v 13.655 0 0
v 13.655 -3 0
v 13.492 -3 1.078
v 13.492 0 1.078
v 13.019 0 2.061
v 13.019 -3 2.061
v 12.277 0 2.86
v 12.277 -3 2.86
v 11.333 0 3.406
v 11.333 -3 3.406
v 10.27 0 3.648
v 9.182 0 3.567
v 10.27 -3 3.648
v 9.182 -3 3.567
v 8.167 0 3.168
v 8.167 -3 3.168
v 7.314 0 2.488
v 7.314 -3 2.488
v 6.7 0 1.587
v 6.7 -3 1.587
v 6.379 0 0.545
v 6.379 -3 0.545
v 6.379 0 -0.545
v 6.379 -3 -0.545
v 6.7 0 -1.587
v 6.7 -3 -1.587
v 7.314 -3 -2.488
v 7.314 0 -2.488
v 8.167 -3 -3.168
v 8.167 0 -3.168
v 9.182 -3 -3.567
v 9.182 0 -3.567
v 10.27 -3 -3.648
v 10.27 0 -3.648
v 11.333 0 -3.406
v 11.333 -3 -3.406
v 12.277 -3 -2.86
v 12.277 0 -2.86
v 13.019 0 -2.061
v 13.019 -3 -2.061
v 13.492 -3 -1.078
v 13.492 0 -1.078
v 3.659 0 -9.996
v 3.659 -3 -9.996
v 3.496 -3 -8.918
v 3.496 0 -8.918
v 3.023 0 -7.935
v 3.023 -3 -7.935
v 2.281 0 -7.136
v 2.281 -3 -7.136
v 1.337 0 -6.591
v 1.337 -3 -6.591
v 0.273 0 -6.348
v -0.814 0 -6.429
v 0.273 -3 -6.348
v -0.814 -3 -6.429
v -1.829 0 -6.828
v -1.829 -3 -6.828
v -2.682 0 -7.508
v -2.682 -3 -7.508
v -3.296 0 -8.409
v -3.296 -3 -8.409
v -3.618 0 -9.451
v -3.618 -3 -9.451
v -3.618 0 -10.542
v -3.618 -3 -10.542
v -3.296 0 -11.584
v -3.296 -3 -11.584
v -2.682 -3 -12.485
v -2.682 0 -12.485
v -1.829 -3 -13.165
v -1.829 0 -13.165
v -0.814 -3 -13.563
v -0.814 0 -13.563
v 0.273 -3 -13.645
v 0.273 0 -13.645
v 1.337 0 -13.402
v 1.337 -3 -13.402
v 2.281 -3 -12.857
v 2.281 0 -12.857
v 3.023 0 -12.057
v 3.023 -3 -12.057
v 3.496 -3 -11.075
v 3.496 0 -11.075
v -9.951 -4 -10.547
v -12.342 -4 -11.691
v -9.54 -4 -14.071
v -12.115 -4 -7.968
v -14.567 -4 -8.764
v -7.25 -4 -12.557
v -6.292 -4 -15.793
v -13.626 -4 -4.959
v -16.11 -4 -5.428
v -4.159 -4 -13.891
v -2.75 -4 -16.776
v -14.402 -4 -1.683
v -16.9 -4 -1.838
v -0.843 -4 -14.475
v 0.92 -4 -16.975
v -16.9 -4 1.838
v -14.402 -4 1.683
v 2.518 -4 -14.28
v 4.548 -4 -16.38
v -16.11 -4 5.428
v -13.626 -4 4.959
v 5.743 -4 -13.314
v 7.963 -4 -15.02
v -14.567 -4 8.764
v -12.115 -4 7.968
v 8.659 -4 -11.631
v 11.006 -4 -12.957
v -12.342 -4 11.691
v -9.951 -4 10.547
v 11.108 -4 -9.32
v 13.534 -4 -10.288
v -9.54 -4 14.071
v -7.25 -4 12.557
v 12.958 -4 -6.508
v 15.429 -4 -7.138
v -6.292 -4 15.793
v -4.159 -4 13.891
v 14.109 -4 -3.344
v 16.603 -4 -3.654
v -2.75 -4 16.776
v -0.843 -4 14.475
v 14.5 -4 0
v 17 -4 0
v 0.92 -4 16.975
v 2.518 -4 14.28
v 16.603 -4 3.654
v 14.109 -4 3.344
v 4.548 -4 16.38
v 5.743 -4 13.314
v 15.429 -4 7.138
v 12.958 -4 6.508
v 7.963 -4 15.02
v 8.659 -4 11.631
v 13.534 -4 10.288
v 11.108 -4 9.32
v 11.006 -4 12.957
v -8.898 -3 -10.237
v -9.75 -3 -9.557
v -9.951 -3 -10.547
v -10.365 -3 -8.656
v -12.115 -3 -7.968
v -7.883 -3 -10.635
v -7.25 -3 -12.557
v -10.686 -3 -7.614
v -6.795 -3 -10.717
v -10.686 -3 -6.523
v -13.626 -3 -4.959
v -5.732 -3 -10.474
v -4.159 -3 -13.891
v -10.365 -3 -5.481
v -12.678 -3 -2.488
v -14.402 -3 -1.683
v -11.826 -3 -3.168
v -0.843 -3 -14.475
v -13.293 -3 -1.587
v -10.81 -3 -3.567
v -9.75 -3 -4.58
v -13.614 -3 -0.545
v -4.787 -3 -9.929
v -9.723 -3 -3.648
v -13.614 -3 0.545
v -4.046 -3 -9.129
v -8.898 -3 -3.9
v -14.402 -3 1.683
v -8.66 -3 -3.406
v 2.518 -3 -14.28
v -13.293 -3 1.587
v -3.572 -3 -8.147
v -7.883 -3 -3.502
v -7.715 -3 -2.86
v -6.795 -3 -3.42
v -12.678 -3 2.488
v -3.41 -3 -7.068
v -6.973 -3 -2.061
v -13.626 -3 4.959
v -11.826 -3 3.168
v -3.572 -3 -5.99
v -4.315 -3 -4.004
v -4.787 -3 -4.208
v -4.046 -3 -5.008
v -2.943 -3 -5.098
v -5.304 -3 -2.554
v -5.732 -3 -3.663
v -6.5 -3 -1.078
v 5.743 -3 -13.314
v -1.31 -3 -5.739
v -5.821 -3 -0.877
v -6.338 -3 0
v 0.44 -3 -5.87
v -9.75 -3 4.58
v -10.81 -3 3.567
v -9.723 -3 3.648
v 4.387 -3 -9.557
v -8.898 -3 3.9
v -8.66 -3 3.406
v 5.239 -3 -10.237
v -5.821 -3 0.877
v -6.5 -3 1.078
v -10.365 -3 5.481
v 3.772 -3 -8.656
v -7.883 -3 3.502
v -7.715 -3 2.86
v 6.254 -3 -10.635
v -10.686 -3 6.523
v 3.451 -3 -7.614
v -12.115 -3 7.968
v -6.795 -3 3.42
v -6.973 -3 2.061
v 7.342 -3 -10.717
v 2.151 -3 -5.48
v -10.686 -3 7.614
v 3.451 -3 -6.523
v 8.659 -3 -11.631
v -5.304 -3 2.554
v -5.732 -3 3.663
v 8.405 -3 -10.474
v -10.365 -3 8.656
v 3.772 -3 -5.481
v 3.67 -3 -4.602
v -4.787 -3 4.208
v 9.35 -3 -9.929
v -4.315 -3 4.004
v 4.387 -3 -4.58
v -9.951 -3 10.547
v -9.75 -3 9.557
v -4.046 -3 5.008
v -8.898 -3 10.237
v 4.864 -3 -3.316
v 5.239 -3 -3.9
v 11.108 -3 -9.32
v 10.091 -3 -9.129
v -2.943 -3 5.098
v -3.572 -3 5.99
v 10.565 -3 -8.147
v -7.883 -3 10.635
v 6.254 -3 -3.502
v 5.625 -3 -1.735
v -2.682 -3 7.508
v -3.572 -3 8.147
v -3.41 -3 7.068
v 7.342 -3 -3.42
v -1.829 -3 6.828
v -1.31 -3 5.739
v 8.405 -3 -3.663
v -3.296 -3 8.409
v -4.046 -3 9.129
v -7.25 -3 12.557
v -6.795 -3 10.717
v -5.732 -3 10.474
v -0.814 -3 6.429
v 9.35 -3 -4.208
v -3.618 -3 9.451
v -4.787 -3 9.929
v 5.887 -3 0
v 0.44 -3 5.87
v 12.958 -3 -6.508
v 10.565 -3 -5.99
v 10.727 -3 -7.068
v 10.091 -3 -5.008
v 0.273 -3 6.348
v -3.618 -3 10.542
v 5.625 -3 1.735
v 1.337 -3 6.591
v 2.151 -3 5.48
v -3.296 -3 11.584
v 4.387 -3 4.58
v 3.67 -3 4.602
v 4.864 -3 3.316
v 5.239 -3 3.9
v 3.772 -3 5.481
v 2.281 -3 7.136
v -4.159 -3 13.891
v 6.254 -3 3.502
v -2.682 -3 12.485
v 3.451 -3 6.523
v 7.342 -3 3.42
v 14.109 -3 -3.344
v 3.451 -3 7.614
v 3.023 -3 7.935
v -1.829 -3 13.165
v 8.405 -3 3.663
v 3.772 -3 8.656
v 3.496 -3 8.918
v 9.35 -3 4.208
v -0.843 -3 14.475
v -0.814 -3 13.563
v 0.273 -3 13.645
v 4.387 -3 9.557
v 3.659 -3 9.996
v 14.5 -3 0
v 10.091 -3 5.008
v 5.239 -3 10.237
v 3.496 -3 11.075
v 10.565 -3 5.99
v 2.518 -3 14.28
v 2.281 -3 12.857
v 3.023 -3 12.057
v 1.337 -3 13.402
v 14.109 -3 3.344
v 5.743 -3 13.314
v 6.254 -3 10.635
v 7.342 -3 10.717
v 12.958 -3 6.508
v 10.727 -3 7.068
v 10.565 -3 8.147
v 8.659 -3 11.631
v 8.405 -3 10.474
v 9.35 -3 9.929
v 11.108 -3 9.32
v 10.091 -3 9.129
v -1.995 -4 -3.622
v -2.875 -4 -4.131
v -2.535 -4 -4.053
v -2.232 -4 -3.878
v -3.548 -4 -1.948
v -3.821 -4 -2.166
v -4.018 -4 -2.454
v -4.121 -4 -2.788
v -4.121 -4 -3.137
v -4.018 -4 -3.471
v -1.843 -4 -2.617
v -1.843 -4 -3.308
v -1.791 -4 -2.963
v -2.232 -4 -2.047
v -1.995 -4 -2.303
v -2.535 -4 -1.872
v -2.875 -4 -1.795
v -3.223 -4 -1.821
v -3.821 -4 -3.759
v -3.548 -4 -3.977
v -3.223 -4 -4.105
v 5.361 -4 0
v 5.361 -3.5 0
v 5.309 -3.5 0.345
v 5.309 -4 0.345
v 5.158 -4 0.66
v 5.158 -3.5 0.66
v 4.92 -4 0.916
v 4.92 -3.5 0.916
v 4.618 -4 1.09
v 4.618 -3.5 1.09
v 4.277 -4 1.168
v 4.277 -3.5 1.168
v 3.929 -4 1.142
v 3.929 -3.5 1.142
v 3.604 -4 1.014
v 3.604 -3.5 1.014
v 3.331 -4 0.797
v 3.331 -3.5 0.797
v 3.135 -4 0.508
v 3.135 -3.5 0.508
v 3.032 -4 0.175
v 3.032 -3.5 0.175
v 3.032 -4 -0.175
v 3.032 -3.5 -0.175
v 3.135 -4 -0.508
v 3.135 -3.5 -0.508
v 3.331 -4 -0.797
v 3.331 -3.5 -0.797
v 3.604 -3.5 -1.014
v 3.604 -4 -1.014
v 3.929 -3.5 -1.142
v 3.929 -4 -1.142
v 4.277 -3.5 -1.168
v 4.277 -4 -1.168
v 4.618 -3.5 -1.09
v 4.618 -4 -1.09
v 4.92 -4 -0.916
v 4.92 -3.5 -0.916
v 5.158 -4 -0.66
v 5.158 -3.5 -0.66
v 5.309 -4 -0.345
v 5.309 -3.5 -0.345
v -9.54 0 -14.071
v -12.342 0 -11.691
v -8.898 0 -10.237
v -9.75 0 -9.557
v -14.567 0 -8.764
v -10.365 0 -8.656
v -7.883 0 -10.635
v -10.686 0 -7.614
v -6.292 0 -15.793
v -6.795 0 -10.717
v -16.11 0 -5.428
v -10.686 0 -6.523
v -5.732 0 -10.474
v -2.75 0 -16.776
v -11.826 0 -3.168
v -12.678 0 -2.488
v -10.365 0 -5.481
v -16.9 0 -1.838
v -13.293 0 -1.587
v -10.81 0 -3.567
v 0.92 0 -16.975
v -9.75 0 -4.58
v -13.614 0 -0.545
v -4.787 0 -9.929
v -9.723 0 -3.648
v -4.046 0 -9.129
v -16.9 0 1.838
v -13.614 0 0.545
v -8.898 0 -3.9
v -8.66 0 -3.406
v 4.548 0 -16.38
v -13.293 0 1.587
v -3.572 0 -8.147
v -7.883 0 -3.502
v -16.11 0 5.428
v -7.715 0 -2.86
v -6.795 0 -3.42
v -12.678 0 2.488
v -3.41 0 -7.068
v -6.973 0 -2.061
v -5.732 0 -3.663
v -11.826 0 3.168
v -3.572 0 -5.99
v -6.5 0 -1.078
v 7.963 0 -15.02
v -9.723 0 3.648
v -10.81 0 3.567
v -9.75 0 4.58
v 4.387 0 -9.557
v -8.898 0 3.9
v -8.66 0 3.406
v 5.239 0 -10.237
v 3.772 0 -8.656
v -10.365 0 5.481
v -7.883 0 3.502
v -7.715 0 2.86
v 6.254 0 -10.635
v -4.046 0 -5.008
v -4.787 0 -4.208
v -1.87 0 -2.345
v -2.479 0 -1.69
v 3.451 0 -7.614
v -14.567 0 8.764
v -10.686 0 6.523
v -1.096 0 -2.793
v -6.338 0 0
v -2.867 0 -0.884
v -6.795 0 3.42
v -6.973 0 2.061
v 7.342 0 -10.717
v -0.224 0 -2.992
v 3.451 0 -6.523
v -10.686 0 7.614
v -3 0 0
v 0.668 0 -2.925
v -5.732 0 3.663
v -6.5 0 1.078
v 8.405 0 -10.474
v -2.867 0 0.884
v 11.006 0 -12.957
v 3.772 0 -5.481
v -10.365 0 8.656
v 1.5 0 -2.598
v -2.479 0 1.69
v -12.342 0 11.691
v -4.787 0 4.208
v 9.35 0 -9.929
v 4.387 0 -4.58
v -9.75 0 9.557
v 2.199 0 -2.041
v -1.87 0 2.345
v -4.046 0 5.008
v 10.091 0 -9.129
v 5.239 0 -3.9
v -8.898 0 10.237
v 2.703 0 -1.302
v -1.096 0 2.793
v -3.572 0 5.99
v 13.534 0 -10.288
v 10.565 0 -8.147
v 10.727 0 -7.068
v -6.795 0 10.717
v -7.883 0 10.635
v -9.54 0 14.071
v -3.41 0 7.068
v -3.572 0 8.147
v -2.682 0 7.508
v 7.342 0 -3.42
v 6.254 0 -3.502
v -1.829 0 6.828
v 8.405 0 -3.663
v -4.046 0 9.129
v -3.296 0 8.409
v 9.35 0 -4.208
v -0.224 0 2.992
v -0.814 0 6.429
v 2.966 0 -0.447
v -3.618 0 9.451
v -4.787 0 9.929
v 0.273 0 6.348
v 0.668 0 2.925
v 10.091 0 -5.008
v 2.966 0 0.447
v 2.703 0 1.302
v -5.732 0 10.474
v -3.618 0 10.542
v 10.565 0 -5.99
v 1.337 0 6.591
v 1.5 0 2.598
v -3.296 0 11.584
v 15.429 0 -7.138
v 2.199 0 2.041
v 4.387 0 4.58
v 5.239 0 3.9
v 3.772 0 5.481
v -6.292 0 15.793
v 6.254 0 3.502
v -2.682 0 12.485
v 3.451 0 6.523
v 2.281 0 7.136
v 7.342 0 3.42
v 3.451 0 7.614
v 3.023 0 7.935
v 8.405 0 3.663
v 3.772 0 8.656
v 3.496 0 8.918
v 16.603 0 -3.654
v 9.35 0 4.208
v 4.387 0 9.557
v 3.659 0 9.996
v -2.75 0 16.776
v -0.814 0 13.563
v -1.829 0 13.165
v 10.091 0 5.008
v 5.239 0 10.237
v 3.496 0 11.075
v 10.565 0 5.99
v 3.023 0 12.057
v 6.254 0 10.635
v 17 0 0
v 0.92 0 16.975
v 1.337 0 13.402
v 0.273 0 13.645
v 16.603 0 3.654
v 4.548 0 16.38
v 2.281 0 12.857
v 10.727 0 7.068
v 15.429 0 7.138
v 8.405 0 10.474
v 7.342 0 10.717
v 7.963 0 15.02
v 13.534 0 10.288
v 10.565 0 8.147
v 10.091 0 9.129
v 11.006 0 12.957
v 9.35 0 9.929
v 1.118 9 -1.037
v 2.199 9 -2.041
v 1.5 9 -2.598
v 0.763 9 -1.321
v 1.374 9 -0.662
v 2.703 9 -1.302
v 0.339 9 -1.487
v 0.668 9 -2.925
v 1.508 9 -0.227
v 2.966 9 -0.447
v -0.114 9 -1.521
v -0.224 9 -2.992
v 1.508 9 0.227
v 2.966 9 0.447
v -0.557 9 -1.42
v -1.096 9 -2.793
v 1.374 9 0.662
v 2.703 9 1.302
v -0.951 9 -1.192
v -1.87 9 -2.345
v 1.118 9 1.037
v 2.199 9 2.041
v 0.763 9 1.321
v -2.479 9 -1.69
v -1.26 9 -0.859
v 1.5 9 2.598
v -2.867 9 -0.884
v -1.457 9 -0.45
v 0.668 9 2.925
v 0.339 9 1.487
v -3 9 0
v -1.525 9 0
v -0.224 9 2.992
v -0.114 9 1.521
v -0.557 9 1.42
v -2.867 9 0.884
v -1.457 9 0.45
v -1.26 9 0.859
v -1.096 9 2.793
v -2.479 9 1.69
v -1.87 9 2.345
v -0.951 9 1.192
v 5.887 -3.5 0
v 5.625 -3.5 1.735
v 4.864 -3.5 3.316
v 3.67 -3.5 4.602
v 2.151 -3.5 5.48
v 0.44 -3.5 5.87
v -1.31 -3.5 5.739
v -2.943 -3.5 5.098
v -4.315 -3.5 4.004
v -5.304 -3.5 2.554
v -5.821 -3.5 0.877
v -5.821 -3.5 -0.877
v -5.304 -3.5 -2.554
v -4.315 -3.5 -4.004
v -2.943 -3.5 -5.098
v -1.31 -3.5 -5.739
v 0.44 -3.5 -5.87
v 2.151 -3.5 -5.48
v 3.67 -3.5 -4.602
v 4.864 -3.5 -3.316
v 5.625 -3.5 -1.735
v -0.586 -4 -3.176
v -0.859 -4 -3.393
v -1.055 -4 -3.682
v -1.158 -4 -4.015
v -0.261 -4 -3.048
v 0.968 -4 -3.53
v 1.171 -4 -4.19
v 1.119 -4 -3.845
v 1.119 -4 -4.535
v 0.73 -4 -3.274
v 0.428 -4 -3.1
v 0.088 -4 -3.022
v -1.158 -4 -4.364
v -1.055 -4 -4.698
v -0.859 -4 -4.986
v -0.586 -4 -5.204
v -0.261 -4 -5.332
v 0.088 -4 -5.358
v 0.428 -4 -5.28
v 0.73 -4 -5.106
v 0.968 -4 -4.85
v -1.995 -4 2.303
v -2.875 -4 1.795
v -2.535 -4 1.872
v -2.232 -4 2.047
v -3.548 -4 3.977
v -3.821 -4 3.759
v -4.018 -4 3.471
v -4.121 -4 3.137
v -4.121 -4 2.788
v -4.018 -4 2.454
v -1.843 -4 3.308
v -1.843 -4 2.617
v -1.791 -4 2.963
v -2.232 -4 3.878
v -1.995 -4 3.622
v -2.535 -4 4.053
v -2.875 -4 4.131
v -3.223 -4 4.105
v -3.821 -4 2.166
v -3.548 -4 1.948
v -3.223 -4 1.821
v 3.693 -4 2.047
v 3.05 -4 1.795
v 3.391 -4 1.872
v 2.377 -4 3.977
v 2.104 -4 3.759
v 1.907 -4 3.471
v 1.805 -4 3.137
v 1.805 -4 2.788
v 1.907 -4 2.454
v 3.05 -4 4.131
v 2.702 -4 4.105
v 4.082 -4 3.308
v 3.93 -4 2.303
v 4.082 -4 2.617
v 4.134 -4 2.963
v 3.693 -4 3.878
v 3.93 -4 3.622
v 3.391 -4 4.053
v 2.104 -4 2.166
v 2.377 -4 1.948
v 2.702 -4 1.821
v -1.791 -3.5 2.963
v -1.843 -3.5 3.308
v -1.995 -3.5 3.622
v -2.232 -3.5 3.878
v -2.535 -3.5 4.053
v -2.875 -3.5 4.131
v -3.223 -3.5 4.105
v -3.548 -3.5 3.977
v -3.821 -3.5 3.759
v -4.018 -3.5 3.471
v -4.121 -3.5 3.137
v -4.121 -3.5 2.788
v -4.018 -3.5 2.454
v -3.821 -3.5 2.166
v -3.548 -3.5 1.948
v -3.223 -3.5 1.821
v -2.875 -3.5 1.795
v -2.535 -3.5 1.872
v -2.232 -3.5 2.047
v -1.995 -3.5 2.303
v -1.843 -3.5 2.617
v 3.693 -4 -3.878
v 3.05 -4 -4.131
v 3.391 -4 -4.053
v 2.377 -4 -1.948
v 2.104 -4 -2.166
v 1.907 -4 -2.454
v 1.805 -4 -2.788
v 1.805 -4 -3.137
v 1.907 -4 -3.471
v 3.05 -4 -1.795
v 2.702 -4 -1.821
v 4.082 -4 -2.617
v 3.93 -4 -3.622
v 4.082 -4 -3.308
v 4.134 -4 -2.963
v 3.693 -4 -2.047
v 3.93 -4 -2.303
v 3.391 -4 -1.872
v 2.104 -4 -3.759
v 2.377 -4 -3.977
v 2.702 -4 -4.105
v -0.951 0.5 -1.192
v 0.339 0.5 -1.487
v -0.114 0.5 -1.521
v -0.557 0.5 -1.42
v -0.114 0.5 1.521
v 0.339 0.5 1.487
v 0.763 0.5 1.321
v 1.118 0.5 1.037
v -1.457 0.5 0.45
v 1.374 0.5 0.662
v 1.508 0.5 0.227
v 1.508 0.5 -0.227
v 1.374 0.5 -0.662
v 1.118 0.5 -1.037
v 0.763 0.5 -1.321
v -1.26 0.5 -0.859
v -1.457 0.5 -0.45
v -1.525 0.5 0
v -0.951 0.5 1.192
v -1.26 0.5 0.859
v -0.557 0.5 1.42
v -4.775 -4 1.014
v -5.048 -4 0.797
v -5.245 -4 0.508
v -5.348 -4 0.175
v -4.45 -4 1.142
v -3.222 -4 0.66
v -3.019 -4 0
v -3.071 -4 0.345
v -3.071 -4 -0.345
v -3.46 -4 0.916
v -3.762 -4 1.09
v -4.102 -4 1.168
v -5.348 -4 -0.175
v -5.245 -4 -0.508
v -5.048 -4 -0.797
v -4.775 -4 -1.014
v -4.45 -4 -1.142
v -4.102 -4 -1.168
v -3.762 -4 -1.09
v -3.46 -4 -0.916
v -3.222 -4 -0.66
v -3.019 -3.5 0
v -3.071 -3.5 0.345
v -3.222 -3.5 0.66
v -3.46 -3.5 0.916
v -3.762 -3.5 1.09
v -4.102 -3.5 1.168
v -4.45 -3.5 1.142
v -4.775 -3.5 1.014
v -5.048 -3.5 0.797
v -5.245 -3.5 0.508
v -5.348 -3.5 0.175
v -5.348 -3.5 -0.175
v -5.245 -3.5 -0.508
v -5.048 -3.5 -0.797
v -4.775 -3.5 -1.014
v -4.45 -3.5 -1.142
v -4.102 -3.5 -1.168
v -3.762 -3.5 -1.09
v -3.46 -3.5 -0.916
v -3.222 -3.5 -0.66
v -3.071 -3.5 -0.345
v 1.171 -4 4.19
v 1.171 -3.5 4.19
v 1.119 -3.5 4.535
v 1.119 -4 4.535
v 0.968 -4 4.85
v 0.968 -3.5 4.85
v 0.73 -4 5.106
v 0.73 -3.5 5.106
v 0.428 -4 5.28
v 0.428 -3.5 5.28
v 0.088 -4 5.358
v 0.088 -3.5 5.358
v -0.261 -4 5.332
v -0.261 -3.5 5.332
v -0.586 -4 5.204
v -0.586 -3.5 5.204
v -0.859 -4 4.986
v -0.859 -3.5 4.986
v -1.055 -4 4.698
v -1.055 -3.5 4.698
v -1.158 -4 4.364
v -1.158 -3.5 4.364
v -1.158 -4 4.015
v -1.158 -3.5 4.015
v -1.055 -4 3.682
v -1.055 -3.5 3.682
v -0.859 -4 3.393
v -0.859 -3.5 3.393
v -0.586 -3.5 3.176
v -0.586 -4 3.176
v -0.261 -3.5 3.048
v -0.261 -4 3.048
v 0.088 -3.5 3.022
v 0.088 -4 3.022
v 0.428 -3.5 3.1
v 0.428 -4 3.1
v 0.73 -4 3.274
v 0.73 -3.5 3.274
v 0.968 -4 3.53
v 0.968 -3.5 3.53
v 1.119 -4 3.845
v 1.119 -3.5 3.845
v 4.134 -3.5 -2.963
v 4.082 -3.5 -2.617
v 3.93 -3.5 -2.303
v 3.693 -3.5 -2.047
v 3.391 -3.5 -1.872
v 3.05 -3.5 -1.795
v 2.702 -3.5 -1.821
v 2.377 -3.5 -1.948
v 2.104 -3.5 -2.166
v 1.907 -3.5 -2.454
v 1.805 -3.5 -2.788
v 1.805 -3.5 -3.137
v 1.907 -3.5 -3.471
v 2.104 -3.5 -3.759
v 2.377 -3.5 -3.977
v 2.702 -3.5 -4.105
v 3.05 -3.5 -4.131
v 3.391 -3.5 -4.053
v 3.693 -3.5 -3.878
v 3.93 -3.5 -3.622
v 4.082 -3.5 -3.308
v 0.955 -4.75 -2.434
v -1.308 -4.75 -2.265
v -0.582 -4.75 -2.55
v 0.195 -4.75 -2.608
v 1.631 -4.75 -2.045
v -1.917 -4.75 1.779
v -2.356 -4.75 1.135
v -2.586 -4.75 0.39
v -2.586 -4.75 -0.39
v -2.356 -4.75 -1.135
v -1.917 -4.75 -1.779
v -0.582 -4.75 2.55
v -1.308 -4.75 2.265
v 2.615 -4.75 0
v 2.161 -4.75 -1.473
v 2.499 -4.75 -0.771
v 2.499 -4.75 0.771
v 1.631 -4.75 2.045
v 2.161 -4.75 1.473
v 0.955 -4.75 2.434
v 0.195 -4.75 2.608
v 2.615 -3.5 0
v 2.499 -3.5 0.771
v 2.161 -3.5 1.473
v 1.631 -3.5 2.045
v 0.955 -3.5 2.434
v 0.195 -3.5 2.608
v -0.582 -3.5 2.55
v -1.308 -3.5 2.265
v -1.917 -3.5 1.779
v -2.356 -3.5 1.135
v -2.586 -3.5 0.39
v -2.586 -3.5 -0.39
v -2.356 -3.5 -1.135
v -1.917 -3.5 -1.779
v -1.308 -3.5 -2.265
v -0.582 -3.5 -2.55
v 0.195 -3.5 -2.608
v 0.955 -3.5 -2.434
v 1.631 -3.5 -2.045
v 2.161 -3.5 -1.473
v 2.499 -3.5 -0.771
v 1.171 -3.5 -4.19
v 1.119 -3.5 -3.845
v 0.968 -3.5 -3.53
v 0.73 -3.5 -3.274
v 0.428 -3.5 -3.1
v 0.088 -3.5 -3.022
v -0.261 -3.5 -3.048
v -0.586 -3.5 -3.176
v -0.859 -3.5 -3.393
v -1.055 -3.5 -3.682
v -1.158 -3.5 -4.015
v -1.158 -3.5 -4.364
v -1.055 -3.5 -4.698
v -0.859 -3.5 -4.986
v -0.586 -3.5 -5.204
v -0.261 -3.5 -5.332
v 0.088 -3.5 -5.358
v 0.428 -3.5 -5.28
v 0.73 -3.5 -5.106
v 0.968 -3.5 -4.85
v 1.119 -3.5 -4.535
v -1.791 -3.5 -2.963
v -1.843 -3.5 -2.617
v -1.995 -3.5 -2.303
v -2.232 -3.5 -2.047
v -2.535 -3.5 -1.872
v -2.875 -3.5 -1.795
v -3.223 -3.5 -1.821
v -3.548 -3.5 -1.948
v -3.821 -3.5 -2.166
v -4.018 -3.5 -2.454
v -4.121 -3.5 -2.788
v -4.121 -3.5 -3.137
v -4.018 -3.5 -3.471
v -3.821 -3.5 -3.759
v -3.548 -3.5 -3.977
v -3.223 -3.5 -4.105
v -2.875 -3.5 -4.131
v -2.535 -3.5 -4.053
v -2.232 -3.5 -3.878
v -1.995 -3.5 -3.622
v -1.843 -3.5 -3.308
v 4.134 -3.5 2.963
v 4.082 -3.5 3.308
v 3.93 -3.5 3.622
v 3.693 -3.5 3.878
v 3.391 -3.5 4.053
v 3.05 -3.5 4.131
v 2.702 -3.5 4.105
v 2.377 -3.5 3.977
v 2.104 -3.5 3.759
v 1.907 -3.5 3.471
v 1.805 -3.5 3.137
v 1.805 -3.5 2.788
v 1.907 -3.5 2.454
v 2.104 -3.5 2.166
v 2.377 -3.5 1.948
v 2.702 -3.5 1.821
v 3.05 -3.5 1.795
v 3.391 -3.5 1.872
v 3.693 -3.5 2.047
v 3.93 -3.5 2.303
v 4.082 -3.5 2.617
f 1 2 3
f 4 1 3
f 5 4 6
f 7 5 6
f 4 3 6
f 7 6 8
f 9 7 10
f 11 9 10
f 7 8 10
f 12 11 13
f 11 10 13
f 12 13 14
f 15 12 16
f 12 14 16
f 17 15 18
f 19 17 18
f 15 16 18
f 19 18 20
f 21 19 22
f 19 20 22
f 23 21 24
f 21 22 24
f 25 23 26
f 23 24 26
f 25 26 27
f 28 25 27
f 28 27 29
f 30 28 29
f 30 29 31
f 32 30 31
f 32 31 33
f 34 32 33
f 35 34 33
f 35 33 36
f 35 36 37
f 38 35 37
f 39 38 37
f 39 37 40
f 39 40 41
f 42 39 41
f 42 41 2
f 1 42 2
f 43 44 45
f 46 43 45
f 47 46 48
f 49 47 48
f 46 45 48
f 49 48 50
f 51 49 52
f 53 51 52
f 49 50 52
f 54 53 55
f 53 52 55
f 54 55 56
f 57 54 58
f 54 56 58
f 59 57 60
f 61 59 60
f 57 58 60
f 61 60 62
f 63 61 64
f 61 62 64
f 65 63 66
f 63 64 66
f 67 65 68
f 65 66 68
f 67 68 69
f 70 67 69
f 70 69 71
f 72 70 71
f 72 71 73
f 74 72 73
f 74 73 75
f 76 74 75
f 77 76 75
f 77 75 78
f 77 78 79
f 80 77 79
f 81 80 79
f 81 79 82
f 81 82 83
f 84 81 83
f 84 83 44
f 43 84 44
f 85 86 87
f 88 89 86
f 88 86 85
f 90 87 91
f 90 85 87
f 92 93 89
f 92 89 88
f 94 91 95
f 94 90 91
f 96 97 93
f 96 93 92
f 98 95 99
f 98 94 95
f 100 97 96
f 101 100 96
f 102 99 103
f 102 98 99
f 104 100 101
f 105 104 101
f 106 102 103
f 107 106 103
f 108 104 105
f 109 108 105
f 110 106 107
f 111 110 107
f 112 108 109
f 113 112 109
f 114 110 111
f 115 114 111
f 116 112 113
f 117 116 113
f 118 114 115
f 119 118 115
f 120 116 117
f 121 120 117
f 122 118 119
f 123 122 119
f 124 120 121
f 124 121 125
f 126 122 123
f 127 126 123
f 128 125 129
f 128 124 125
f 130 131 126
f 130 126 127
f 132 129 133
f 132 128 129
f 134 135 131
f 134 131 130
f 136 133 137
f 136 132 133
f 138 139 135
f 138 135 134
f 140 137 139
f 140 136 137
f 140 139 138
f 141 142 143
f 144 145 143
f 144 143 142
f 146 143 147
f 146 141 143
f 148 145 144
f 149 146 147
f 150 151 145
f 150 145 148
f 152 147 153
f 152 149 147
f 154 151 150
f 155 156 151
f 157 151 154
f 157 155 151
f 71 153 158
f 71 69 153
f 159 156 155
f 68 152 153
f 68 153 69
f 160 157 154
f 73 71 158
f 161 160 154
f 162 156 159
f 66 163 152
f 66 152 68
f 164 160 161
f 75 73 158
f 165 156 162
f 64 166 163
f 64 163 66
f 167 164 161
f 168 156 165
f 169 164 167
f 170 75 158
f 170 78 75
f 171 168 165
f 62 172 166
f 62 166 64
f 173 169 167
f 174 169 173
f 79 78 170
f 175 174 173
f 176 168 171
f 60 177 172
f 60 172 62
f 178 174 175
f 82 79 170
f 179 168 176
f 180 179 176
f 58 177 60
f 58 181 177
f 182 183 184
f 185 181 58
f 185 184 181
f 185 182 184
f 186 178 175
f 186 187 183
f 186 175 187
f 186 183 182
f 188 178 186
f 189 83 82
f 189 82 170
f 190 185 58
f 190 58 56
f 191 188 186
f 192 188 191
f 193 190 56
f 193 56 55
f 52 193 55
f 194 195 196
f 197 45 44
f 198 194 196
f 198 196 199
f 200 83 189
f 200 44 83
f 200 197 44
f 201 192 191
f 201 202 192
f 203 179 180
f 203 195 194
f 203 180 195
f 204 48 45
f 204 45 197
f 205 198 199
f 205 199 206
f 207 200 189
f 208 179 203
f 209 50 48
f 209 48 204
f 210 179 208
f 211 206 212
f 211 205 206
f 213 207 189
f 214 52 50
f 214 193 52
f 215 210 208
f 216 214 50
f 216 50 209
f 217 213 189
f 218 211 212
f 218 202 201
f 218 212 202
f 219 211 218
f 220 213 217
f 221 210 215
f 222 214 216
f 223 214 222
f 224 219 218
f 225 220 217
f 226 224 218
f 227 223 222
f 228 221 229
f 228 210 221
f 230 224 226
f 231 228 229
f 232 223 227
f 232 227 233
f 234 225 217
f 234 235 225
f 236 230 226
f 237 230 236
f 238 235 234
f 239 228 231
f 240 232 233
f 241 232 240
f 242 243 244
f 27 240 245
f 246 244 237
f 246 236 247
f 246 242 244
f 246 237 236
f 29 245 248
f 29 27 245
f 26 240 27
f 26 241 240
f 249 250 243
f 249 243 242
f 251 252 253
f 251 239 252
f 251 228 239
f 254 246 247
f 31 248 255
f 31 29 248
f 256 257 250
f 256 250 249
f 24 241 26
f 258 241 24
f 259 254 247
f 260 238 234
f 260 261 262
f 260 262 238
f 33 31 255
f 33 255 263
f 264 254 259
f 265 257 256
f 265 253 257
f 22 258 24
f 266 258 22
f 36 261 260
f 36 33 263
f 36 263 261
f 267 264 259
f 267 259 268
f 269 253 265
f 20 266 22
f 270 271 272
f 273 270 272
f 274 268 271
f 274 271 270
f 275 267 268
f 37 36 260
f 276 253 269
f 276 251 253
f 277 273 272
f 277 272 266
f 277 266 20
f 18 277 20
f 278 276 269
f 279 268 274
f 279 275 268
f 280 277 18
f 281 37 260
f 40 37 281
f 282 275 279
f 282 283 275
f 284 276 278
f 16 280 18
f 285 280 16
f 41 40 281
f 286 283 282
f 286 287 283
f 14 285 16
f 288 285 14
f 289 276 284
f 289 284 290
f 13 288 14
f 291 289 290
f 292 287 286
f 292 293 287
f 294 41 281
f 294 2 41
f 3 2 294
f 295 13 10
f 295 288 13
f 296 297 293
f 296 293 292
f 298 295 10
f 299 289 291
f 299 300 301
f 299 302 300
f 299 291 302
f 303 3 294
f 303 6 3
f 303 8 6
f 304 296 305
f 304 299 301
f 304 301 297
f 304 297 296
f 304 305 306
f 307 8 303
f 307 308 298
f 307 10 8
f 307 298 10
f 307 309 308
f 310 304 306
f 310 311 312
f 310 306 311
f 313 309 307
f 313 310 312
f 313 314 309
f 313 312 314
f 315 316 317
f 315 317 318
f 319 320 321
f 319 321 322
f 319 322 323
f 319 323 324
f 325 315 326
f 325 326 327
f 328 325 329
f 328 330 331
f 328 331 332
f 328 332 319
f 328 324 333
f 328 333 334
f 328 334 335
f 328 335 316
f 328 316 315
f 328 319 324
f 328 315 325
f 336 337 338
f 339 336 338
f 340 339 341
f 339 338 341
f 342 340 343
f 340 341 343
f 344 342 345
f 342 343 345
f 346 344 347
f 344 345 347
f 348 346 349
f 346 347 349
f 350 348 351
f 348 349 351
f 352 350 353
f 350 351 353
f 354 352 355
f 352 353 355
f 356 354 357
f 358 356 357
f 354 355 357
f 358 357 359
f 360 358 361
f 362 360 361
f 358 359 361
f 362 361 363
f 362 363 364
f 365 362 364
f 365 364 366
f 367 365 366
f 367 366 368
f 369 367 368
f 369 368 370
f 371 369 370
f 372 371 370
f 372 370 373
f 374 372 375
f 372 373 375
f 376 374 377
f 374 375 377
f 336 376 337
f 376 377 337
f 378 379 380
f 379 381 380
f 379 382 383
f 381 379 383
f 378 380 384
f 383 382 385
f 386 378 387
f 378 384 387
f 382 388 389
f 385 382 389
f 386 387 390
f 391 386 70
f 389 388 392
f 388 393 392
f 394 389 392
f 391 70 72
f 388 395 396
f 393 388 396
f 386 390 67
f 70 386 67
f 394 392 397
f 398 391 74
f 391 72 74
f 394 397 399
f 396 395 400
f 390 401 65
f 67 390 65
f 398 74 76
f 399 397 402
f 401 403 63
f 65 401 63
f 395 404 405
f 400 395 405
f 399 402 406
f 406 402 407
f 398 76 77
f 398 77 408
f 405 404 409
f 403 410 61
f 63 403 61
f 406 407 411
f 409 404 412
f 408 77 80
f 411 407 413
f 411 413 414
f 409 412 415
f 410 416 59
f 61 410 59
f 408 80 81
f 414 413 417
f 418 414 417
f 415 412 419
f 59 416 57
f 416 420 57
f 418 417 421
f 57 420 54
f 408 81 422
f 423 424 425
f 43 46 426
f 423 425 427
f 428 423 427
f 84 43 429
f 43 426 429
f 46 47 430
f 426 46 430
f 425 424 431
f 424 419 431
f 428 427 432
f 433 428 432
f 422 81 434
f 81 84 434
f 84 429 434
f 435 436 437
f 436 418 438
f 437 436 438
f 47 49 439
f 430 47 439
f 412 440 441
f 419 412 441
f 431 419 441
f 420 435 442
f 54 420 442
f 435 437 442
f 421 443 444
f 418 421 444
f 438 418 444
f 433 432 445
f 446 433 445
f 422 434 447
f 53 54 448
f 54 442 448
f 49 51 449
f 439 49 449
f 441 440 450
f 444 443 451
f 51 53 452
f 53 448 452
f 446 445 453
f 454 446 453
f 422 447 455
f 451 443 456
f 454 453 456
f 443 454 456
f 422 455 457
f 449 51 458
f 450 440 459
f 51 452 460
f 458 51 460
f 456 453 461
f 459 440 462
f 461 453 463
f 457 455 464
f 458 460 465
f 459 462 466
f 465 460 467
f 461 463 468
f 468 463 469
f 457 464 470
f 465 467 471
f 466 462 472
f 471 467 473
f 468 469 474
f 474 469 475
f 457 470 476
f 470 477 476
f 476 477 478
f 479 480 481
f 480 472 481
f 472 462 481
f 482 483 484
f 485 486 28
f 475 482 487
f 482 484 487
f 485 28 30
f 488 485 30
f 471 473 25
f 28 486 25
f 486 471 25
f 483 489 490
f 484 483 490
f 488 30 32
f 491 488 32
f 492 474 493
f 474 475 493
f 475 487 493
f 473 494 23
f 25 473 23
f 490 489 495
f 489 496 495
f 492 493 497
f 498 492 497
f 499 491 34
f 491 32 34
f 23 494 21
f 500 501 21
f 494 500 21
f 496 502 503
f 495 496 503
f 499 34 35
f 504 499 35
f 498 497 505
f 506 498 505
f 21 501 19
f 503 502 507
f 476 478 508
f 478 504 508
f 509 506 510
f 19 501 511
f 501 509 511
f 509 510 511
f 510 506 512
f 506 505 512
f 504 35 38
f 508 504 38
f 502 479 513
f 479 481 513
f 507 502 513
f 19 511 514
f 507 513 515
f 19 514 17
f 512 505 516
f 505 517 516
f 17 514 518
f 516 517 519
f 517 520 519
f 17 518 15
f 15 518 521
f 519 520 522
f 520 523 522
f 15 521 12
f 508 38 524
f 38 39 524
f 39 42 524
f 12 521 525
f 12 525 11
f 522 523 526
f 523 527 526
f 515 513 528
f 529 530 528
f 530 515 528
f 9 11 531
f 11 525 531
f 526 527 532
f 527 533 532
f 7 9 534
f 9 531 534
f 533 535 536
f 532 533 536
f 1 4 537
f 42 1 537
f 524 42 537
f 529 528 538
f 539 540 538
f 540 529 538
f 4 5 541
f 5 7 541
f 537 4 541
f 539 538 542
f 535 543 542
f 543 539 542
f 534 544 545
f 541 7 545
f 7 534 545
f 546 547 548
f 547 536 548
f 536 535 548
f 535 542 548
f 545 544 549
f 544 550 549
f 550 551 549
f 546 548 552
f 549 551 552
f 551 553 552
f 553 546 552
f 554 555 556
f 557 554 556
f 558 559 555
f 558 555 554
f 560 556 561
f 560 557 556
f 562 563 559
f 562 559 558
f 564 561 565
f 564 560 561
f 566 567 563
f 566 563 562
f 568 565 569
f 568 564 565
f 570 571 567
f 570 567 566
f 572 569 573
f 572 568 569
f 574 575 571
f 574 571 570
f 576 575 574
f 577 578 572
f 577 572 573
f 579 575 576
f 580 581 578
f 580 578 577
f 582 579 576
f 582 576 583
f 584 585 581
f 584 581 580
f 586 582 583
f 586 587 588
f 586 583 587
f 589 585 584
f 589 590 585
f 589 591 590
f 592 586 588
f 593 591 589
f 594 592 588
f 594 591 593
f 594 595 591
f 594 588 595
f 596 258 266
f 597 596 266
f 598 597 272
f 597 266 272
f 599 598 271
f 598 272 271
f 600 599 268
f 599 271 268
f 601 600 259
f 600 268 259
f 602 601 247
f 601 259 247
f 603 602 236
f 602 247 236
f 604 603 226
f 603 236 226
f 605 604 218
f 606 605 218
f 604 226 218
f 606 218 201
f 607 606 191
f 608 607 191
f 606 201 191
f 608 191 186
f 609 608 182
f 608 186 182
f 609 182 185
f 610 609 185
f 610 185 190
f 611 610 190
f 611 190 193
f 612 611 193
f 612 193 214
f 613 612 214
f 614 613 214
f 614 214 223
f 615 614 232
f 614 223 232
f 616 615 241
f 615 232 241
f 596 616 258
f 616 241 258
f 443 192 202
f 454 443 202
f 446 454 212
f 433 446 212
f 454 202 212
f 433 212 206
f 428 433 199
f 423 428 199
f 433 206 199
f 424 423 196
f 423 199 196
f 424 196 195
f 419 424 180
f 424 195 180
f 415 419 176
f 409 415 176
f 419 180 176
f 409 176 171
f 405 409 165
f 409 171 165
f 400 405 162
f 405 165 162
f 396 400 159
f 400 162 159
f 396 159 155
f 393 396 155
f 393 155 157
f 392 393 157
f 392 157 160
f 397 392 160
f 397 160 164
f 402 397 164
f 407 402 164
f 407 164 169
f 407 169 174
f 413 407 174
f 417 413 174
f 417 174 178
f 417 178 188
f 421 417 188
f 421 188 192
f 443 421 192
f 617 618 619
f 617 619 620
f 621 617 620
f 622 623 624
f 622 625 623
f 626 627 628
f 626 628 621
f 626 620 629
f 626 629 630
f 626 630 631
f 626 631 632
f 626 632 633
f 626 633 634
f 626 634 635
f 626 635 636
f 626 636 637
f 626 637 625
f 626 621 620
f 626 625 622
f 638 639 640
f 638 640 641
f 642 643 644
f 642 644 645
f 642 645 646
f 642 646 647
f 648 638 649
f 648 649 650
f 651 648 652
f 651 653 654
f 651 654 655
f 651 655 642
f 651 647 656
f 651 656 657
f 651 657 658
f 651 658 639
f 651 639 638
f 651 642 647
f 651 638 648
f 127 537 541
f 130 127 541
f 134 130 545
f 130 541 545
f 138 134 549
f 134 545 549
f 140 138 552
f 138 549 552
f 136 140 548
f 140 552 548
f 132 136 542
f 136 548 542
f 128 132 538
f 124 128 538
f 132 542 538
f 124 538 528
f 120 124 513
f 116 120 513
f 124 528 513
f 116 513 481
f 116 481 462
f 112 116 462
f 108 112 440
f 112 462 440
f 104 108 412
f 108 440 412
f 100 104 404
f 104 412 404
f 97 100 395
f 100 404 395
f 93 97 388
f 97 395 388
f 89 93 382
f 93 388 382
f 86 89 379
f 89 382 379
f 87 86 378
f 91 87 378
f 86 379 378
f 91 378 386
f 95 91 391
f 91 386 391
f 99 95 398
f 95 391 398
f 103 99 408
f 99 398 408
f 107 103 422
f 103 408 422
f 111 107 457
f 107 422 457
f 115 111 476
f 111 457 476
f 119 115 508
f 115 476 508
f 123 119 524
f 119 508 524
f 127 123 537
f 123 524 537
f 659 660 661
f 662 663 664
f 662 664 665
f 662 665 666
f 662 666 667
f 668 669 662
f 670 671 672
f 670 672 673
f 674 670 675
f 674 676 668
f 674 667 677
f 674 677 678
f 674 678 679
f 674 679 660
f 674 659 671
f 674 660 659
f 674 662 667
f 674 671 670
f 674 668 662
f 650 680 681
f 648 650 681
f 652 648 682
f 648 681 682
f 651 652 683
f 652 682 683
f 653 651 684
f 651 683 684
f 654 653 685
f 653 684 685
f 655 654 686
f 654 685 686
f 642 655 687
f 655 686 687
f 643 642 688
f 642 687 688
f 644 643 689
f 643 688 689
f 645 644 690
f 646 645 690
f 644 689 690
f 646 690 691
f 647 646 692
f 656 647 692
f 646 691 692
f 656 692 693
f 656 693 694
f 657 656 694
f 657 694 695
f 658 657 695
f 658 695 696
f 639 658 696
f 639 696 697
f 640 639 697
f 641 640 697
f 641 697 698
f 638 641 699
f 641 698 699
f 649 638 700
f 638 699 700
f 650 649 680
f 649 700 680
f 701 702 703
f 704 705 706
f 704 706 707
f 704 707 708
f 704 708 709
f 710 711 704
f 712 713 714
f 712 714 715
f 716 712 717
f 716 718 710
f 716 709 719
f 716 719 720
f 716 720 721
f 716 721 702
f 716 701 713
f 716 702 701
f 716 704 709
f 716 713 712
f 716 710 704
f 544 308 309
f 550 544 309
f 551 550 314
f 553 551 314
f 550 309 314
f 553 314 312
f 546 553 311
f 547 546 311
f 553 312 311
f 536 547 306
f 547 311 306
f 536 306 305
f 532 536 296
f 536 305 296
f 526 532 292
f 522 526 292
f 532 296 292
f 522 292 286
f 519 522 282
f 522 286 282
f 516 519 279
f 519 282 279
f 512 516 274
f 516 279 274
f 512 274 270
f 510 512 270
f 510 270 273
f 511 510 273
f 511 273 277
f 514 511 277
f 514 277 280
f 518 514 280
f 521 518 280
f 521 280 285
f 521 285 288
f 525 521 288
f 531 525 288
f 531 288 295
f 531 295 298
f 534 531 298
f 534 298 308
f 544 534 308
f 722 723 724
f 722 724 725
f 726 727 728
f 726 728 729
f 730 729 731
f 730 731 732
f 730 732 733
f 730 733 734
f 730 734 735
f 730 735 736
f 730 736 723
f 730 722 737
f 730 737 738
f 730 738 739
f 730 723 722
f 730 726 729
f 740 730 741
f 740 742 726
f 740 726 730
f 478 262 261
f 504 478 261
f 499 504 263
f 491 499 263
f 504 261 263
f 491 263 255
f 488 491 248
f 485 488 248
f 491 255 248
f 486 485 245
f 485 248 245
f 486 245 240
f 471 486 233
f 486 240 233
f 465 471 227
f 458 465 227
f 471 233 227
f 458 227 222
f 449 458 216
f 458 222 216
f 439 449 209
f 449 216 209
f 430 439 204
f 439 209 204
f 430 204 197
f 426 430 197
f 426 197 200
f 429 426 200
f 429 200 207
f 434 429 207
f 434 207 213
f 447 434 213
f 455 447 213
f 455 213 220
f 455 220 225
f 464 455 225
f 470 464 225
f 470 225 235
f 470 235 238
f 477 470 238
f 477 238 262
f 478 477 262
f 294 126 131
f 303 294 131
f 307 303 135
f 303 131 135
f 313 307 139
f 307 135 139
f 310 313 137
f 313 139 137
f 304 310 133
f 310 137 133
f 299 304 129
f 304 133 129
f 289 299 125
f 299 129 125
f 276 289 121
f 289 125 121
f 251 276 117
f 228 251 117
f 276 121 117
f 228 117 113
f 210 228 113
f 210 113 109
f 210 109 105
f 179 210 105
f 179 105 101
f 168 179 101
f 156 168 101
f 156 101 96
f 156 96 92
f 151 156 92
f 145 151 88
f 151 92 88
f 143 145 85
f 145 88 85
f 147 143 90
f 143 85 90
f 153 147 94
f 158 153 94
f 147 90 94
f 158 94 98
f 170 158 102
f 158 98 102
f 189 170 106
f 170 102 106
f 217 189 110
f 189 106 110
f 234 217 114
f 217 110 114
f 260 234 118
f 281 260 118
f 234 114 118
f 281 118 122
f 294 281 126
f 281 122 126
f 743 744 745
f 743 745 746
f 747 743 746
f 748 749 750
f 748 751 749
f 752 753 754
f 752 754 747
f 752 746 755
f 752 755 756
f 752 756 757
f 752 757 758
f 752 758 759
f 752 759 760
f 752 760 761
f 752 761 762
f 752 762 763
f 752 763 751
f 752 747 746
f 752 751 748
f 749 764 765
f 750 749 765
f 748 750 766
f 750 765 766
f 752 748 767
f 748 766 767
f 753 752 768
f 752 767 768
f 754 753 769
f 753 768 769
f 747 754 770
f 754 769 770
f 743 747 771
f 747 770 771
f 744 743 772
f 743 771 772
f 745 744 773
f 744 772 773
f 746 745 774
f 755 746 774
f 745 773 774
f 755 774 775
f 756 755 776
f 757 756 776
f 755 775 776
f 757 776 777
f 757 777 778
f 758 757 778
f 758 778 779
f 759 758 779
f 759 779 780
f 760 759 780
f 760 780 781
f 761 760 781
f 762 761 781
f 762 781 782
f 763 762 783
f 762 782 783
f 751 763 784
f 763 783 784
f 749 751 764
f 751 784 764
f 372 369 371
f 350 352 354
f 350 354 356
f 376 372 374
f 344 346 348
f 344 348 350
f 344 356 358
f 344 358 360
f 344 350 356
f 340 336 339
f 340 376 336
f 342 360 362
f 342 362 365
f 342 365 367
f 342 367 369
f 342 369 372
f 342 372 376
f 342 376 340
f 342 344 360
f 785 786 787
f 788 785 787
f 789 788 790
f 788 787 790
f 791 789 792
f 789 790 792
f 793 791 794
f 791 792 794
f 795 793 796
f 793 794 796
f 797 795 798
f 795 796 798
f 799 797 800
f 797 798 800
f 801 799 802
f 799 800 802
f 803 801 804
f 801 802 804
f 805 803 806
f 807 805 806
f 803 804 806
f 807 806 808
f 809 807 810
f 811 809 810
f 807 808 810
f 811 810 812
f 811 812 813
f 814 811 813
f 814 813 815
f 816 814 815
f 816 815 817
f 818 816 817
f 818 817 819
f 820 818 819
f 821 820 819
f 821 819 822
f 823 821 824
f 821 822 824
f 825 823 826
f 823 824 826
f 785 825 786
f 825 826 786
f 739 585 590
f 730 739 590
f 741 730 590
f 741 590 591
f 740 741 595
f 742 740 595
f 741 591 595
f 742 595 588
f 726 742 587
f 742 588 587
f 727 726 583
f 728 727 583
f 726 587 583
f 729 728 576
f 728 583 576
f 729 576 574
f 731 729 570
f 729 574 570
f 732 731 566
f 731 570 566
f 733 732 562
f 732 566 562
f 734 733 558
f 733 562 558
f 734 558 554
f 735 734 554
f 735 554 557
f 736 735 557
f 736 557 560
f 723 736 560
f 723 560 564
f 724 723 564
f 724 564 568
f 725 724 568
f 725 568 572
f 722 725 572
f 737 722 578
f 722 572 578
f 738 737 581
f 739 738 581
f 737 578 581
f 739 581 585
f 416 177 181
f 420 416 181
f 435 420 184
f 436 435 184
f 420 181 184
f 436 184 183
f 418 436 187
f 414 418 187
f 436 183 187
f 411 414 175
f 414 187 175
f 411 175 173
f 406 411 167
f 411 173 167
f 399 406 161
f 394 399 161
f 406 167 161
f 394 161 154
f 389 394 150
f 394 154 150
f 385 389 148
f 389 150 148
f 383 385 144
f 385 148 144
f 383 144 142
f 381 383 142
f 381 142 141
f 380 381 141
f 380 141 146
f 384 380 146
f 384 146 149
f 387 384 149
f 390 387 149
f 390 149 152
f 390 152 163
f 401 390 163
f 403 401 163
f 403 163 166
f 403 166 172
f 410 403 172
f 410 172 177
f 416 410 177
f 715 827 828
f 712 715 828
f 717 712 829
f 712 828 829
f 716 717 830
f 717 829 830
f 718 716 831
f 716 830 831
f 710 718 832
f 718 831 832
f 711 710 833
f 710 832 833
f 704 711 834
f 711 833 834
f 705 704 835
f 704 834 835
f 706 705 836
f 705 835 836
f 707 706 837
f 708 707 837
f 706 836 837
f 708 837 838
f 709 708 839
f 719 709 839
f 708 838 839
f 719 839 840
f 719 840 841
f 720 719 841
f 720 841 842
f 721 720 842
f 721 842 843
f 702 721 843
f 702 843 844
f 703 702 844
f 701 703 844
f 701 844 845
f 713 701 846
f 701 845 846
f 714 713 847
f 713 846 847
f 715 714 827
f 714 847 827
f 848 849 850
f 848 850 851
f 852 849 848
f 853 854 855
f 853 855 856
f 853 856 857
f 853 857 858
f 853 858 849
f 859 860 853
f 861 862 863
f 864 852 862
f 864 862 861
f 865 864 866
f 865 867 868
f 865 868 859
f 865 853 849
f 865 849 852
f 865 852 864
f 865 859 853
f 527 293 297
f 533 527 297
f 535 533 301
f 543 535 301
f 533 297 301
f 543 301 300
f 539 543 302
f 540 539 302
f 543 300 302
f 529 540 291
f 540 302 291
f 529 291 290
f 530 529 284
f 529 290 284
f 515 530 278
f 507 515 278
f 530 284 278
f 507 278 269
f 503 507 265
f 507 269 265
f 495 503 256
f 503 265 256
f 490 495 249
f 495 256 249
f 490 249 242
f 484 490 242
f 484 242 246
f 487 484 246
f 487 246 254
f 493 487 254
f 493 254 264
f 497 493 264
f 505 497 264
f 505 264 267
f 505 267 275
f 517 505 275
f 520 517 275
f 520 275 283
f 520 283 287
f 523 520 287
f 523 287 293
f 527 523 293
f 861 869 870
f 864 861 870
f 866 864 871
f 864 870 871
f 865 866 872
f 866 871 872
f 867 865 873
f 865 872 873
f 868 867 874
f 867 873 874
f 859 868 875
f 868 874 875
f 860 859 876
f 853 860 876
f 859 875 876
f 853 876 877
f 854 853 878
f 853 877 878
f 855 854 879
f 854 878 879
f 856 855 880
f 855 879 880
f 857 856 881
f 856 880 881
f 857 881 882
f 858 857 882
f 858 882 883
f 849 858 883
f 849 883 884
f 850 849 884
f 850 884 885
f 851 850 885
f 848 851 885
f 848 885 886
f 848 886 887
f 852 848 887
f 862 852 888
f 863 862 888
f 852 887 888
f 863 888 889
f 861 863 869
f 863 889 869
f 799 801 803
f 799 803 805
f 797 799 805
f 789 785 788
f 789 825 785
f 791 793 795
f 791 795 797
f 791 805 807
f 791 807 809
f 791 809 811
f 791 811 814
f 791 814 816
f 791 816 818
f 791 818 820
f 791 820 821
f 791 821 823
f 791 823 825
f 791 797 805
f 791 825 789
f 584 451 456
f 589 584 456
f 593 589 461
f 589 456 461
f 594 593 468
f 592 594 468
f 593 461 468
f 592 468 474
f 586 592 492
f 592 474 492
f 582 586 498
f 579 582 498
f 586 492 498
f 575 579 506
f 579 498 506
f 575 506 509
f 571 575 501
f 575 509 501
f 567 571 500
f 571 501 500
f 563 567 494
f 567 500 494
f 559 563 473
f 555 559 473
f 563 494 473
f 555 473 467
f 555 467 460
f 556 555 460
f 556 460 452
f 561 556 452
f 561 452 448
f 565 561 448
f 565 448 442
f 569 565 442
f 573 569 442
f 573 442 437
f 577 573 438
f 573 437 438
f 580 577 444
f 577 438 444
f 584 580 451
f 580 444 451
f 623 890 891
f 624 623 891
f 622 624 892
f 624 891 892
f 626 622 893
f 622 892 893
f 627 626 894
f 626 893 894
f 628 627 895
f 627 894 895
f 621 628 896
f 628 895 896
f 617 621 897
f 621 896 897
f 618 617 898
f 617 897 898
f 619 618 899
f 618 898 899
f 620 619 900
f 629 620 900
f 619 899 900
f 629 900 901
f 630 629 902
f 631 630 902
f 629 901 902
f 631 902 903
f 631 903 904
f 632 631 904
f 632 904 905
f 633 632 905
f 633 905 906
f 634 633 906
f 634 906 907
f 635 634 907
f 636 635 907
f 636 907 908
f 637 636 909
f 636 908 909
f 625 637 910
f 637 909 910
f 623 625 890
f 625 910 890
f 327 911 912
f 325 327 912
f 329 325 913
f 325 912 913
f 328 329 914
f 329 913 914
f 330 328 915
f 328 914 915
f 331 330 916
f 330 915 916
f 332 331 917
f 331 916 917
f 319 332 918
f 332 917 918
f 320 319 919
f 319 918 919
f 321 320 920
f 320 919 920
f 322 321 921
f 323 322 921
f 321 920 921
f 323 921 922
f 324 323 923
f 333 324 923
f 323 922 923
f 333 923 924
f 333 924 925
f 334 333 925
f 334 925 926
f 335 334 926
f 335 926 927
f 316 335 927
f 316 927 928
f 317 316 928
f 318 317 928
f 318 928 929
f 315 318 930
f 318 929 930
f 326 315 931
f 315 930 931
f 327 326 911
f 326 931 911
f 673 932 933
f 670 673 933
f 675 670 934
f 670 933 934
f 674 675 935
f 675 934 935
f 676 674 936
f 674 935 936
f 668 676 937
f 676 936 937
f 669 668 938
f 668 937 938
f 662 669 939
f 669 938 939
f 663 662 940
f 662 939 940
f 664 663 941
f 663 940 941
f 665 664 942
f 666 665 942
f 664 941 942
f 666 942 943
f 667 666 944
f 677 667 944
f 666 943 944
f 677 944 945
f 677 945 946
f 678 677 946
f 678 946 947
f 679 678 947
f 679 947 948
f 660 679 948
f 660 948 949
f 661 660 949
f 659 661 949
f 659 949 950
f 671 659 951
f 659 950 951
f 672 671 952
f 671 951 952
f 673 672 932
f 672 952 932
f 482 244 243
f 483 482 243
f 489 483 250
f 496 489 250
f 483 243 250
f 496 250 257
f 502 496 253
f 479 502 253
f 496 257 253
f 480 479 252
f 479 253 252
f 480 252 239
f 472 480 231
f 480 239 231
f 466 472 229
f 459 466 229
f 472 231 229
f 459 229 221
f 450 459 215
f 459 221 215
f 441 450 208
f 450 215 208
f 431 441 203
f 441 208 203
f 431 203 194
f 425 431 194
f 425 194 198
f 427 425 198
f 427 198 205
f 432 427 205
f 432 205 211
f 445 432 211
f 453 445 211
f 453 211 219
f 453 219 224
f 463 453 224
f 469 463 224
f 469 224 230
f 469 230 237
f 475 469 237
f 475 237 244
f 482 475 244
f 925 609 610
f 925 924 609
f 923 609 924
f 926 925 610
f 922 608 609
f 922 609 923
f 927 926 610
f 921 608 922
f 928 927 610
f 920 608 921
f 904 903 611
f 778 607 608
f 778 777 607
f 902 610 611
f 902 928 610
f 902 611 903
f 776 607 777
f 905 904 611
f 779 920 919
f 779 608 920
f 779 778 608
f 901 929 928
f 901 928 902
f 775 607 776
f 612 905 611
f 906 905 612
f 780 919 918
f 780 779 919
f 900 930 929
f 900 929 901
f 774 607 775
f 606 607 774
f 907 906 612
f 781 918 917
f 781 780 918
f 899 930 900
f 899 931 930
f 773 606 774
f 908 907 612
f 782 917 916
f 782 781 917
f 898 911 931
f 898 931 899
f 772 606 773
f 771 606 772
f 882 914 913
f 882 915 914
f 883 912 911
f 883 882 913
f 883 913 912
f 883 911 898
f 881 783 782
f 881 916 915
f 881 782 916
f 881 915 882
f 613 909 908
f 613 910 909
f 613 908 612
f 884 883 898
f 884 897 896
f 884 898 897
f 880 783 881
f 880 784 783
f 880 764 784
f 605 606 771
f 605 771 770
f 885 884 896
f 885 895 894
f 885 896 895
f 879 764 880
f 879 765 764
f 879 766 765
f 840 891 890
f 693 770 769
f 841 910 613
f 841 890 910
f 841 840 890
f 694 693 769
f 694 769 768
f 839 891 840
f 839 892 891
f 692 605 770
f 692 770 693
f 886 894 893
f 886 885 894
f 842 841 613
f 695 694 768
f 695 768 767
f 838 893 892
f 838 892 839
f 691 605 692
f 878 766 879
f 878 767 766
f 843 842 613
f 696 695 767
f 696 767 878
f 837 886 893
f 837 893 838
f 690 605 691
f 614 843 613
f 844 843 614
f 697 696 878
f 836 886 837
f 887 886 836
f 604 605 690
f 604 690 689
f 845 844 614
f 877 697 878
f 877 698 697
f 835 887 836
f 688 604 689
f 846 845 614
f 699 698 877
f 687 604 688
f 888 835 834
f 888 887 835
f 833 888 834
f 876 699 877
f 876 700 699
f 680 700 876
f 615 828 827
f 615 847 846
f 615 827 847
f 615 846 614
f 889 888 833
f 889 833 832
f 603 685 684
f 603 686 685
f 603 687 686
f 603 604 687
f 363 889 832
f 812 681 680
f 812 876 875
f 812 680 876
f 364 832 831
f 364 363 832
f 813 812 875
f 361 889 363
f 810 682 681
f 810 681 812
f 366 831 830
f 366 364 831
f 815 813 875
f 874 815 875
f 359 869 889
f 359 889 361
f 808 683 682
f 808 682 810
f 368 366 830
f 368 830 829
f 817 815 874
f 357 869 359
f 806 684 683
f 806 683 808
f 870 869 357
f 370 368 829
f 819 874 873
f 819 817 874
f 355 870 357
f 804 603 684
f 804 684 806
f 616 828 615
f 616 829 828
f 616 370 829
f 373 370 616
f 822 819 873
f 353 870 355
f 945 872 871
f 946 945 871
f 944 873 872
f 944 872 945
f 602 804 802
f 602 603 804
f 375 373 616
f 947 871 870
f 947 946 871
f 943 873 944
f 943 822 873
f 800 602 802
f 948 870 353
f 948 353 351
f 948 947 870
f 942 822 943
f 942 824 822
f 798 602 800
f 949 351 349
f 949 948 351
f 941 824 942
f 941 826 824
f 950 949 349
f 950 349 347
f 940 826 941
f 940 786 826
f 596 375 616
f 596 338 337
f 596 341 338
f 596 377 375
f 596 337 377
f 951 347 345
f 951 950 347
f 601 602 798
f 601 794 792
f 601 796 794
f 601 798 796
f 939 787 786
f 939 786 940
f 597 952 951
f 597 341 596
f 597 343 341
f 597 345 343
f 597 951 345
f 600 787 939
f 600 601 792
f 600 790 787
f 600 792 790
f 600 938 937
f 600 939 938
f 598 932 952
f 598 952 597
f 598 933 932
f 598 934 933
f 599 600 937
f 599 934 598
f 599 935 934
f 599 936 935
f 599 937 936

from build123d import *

# Parameters (mm, degrees)
F0_R      = 17
F0_R_2    = 14.5
F1_DEPTH  = 4
F2_R      = 14.5
F3_DEPTH  = 1
F4_R      = 3.658597032
F5_DEPTH  = 25
F6_R      = 5.8865262856
F7_DEPTH  = 0.5
F8_R      = 1.1712356188
F9_DEPTH  = 0.5
F10_R     = 2.6152305959
F11_DEPTH = 1.25
F12_R     = 3
F13_DEPTH = 9
F14_R     = 1.525
F15_DEPTH = 8.5


with BuildPart() as f1:
    # F0 (on Front) → F1 (new body)
    with BuildSketch(Plane.XZ):
        Circle(F0_R)
        Circle(F0_R_2, mode=Mode.SUBTRACT)
        Circle(F0_R_2)
    extrude(amount=F1_DEPTH)

    # F2 (on face) → F3 (cut)
    with BuildSketch(Plane.XZ.offset(4)):
        Circle(F2_R)
    extrude(amount=-F3_DEPTH, mode=Mode.SUBTRACT)

    # F4 (on face) → F5 (cut)
    with BuildSketch(Plane.XZ.offset(3)):
        with Locations((-7.0684690372, 7.0684690372)):
            Circle(F4_R)
        with Locations((-9.9963247776, 0)):
            Circle(F4_R)
        with Locations((0, 9.9963247776)):
            Circle(F4_R)
        with Locations((7.0684690372, 7.0684690372)):
            Circle(F4_R)
        with Locations((9.9963247776, 0)):
            Circle(F4_R)
        with Locations((7.0684690372, -7.0684690372)):
            Circle(F4_R)
        with Locations((0, -9.9963247776)):
            Circle(F4_R)
        with Locations((-7.0684690372, -7.0684690372)):
            Circle(F4_R)
    extrude(amount=-F5_DEPTH, mode=Mode.SUBTRACT)

    # F6 (on face) → F7 (join)
    with BuildSketch(Plane.XZ.offset(3)):
        Circle(F6_R)
    extrude(amount=F7_DEPTH)

    # F8 (on face) → F9 (join)
    with BuildSketch(Plane.XZ.offset(3.5)):
        with Locations((-2.9626692521, 2.9626692521)):
            Circle(F8_R)
        with Locations((0, 4.1898470372)):
            Circle(F8_R)
        with Locations((2.9626692521, 2.9626692521)):
            Circle(F8_R)
        with Locations((4.1898470372, 0)):
            Circle(F8_R)
        with Locations((2.9626692521, -2.9626692521)):
            Circle(F8_R)
        with Locations((0, -4.1898470372)):
            Circle(F8_R)
        with Locations((-2.9626692521, -2.9626692521)):
            Circle(F8_R)
        with Locations((-4.1898470372, 0)):
            Circle(F8_R)
    extrude(amount=F9_DEPTH)

    # F10 (on face) → F11 (join)
    with BuildSketch(Plane.XZ.offset(3.5)):
        Circle(F10_R)
    extrude(amount=F11_DEPTH)

    # F12 (on face) → F13 (join)
    with BuildSketch(Plane(origin=(0, 0, 0), x_dir=(-1, 0, 0), z_dir=(0, 1, 0))):
        Circle(F12_R)
    extrude(amount=F13_DEPTH)

    # F14 (on face) → F15 (cut)
    with BuildSketch(Plane(origin=(0, 9, 0), x_dir=(-1, 0, 0), z_dir=(0, 1, 0))):
        Circle(F14_R)
    extrude(amount=-F15_DEPTH, mode=Mode.SUBTRACT)


solid = f1.part
